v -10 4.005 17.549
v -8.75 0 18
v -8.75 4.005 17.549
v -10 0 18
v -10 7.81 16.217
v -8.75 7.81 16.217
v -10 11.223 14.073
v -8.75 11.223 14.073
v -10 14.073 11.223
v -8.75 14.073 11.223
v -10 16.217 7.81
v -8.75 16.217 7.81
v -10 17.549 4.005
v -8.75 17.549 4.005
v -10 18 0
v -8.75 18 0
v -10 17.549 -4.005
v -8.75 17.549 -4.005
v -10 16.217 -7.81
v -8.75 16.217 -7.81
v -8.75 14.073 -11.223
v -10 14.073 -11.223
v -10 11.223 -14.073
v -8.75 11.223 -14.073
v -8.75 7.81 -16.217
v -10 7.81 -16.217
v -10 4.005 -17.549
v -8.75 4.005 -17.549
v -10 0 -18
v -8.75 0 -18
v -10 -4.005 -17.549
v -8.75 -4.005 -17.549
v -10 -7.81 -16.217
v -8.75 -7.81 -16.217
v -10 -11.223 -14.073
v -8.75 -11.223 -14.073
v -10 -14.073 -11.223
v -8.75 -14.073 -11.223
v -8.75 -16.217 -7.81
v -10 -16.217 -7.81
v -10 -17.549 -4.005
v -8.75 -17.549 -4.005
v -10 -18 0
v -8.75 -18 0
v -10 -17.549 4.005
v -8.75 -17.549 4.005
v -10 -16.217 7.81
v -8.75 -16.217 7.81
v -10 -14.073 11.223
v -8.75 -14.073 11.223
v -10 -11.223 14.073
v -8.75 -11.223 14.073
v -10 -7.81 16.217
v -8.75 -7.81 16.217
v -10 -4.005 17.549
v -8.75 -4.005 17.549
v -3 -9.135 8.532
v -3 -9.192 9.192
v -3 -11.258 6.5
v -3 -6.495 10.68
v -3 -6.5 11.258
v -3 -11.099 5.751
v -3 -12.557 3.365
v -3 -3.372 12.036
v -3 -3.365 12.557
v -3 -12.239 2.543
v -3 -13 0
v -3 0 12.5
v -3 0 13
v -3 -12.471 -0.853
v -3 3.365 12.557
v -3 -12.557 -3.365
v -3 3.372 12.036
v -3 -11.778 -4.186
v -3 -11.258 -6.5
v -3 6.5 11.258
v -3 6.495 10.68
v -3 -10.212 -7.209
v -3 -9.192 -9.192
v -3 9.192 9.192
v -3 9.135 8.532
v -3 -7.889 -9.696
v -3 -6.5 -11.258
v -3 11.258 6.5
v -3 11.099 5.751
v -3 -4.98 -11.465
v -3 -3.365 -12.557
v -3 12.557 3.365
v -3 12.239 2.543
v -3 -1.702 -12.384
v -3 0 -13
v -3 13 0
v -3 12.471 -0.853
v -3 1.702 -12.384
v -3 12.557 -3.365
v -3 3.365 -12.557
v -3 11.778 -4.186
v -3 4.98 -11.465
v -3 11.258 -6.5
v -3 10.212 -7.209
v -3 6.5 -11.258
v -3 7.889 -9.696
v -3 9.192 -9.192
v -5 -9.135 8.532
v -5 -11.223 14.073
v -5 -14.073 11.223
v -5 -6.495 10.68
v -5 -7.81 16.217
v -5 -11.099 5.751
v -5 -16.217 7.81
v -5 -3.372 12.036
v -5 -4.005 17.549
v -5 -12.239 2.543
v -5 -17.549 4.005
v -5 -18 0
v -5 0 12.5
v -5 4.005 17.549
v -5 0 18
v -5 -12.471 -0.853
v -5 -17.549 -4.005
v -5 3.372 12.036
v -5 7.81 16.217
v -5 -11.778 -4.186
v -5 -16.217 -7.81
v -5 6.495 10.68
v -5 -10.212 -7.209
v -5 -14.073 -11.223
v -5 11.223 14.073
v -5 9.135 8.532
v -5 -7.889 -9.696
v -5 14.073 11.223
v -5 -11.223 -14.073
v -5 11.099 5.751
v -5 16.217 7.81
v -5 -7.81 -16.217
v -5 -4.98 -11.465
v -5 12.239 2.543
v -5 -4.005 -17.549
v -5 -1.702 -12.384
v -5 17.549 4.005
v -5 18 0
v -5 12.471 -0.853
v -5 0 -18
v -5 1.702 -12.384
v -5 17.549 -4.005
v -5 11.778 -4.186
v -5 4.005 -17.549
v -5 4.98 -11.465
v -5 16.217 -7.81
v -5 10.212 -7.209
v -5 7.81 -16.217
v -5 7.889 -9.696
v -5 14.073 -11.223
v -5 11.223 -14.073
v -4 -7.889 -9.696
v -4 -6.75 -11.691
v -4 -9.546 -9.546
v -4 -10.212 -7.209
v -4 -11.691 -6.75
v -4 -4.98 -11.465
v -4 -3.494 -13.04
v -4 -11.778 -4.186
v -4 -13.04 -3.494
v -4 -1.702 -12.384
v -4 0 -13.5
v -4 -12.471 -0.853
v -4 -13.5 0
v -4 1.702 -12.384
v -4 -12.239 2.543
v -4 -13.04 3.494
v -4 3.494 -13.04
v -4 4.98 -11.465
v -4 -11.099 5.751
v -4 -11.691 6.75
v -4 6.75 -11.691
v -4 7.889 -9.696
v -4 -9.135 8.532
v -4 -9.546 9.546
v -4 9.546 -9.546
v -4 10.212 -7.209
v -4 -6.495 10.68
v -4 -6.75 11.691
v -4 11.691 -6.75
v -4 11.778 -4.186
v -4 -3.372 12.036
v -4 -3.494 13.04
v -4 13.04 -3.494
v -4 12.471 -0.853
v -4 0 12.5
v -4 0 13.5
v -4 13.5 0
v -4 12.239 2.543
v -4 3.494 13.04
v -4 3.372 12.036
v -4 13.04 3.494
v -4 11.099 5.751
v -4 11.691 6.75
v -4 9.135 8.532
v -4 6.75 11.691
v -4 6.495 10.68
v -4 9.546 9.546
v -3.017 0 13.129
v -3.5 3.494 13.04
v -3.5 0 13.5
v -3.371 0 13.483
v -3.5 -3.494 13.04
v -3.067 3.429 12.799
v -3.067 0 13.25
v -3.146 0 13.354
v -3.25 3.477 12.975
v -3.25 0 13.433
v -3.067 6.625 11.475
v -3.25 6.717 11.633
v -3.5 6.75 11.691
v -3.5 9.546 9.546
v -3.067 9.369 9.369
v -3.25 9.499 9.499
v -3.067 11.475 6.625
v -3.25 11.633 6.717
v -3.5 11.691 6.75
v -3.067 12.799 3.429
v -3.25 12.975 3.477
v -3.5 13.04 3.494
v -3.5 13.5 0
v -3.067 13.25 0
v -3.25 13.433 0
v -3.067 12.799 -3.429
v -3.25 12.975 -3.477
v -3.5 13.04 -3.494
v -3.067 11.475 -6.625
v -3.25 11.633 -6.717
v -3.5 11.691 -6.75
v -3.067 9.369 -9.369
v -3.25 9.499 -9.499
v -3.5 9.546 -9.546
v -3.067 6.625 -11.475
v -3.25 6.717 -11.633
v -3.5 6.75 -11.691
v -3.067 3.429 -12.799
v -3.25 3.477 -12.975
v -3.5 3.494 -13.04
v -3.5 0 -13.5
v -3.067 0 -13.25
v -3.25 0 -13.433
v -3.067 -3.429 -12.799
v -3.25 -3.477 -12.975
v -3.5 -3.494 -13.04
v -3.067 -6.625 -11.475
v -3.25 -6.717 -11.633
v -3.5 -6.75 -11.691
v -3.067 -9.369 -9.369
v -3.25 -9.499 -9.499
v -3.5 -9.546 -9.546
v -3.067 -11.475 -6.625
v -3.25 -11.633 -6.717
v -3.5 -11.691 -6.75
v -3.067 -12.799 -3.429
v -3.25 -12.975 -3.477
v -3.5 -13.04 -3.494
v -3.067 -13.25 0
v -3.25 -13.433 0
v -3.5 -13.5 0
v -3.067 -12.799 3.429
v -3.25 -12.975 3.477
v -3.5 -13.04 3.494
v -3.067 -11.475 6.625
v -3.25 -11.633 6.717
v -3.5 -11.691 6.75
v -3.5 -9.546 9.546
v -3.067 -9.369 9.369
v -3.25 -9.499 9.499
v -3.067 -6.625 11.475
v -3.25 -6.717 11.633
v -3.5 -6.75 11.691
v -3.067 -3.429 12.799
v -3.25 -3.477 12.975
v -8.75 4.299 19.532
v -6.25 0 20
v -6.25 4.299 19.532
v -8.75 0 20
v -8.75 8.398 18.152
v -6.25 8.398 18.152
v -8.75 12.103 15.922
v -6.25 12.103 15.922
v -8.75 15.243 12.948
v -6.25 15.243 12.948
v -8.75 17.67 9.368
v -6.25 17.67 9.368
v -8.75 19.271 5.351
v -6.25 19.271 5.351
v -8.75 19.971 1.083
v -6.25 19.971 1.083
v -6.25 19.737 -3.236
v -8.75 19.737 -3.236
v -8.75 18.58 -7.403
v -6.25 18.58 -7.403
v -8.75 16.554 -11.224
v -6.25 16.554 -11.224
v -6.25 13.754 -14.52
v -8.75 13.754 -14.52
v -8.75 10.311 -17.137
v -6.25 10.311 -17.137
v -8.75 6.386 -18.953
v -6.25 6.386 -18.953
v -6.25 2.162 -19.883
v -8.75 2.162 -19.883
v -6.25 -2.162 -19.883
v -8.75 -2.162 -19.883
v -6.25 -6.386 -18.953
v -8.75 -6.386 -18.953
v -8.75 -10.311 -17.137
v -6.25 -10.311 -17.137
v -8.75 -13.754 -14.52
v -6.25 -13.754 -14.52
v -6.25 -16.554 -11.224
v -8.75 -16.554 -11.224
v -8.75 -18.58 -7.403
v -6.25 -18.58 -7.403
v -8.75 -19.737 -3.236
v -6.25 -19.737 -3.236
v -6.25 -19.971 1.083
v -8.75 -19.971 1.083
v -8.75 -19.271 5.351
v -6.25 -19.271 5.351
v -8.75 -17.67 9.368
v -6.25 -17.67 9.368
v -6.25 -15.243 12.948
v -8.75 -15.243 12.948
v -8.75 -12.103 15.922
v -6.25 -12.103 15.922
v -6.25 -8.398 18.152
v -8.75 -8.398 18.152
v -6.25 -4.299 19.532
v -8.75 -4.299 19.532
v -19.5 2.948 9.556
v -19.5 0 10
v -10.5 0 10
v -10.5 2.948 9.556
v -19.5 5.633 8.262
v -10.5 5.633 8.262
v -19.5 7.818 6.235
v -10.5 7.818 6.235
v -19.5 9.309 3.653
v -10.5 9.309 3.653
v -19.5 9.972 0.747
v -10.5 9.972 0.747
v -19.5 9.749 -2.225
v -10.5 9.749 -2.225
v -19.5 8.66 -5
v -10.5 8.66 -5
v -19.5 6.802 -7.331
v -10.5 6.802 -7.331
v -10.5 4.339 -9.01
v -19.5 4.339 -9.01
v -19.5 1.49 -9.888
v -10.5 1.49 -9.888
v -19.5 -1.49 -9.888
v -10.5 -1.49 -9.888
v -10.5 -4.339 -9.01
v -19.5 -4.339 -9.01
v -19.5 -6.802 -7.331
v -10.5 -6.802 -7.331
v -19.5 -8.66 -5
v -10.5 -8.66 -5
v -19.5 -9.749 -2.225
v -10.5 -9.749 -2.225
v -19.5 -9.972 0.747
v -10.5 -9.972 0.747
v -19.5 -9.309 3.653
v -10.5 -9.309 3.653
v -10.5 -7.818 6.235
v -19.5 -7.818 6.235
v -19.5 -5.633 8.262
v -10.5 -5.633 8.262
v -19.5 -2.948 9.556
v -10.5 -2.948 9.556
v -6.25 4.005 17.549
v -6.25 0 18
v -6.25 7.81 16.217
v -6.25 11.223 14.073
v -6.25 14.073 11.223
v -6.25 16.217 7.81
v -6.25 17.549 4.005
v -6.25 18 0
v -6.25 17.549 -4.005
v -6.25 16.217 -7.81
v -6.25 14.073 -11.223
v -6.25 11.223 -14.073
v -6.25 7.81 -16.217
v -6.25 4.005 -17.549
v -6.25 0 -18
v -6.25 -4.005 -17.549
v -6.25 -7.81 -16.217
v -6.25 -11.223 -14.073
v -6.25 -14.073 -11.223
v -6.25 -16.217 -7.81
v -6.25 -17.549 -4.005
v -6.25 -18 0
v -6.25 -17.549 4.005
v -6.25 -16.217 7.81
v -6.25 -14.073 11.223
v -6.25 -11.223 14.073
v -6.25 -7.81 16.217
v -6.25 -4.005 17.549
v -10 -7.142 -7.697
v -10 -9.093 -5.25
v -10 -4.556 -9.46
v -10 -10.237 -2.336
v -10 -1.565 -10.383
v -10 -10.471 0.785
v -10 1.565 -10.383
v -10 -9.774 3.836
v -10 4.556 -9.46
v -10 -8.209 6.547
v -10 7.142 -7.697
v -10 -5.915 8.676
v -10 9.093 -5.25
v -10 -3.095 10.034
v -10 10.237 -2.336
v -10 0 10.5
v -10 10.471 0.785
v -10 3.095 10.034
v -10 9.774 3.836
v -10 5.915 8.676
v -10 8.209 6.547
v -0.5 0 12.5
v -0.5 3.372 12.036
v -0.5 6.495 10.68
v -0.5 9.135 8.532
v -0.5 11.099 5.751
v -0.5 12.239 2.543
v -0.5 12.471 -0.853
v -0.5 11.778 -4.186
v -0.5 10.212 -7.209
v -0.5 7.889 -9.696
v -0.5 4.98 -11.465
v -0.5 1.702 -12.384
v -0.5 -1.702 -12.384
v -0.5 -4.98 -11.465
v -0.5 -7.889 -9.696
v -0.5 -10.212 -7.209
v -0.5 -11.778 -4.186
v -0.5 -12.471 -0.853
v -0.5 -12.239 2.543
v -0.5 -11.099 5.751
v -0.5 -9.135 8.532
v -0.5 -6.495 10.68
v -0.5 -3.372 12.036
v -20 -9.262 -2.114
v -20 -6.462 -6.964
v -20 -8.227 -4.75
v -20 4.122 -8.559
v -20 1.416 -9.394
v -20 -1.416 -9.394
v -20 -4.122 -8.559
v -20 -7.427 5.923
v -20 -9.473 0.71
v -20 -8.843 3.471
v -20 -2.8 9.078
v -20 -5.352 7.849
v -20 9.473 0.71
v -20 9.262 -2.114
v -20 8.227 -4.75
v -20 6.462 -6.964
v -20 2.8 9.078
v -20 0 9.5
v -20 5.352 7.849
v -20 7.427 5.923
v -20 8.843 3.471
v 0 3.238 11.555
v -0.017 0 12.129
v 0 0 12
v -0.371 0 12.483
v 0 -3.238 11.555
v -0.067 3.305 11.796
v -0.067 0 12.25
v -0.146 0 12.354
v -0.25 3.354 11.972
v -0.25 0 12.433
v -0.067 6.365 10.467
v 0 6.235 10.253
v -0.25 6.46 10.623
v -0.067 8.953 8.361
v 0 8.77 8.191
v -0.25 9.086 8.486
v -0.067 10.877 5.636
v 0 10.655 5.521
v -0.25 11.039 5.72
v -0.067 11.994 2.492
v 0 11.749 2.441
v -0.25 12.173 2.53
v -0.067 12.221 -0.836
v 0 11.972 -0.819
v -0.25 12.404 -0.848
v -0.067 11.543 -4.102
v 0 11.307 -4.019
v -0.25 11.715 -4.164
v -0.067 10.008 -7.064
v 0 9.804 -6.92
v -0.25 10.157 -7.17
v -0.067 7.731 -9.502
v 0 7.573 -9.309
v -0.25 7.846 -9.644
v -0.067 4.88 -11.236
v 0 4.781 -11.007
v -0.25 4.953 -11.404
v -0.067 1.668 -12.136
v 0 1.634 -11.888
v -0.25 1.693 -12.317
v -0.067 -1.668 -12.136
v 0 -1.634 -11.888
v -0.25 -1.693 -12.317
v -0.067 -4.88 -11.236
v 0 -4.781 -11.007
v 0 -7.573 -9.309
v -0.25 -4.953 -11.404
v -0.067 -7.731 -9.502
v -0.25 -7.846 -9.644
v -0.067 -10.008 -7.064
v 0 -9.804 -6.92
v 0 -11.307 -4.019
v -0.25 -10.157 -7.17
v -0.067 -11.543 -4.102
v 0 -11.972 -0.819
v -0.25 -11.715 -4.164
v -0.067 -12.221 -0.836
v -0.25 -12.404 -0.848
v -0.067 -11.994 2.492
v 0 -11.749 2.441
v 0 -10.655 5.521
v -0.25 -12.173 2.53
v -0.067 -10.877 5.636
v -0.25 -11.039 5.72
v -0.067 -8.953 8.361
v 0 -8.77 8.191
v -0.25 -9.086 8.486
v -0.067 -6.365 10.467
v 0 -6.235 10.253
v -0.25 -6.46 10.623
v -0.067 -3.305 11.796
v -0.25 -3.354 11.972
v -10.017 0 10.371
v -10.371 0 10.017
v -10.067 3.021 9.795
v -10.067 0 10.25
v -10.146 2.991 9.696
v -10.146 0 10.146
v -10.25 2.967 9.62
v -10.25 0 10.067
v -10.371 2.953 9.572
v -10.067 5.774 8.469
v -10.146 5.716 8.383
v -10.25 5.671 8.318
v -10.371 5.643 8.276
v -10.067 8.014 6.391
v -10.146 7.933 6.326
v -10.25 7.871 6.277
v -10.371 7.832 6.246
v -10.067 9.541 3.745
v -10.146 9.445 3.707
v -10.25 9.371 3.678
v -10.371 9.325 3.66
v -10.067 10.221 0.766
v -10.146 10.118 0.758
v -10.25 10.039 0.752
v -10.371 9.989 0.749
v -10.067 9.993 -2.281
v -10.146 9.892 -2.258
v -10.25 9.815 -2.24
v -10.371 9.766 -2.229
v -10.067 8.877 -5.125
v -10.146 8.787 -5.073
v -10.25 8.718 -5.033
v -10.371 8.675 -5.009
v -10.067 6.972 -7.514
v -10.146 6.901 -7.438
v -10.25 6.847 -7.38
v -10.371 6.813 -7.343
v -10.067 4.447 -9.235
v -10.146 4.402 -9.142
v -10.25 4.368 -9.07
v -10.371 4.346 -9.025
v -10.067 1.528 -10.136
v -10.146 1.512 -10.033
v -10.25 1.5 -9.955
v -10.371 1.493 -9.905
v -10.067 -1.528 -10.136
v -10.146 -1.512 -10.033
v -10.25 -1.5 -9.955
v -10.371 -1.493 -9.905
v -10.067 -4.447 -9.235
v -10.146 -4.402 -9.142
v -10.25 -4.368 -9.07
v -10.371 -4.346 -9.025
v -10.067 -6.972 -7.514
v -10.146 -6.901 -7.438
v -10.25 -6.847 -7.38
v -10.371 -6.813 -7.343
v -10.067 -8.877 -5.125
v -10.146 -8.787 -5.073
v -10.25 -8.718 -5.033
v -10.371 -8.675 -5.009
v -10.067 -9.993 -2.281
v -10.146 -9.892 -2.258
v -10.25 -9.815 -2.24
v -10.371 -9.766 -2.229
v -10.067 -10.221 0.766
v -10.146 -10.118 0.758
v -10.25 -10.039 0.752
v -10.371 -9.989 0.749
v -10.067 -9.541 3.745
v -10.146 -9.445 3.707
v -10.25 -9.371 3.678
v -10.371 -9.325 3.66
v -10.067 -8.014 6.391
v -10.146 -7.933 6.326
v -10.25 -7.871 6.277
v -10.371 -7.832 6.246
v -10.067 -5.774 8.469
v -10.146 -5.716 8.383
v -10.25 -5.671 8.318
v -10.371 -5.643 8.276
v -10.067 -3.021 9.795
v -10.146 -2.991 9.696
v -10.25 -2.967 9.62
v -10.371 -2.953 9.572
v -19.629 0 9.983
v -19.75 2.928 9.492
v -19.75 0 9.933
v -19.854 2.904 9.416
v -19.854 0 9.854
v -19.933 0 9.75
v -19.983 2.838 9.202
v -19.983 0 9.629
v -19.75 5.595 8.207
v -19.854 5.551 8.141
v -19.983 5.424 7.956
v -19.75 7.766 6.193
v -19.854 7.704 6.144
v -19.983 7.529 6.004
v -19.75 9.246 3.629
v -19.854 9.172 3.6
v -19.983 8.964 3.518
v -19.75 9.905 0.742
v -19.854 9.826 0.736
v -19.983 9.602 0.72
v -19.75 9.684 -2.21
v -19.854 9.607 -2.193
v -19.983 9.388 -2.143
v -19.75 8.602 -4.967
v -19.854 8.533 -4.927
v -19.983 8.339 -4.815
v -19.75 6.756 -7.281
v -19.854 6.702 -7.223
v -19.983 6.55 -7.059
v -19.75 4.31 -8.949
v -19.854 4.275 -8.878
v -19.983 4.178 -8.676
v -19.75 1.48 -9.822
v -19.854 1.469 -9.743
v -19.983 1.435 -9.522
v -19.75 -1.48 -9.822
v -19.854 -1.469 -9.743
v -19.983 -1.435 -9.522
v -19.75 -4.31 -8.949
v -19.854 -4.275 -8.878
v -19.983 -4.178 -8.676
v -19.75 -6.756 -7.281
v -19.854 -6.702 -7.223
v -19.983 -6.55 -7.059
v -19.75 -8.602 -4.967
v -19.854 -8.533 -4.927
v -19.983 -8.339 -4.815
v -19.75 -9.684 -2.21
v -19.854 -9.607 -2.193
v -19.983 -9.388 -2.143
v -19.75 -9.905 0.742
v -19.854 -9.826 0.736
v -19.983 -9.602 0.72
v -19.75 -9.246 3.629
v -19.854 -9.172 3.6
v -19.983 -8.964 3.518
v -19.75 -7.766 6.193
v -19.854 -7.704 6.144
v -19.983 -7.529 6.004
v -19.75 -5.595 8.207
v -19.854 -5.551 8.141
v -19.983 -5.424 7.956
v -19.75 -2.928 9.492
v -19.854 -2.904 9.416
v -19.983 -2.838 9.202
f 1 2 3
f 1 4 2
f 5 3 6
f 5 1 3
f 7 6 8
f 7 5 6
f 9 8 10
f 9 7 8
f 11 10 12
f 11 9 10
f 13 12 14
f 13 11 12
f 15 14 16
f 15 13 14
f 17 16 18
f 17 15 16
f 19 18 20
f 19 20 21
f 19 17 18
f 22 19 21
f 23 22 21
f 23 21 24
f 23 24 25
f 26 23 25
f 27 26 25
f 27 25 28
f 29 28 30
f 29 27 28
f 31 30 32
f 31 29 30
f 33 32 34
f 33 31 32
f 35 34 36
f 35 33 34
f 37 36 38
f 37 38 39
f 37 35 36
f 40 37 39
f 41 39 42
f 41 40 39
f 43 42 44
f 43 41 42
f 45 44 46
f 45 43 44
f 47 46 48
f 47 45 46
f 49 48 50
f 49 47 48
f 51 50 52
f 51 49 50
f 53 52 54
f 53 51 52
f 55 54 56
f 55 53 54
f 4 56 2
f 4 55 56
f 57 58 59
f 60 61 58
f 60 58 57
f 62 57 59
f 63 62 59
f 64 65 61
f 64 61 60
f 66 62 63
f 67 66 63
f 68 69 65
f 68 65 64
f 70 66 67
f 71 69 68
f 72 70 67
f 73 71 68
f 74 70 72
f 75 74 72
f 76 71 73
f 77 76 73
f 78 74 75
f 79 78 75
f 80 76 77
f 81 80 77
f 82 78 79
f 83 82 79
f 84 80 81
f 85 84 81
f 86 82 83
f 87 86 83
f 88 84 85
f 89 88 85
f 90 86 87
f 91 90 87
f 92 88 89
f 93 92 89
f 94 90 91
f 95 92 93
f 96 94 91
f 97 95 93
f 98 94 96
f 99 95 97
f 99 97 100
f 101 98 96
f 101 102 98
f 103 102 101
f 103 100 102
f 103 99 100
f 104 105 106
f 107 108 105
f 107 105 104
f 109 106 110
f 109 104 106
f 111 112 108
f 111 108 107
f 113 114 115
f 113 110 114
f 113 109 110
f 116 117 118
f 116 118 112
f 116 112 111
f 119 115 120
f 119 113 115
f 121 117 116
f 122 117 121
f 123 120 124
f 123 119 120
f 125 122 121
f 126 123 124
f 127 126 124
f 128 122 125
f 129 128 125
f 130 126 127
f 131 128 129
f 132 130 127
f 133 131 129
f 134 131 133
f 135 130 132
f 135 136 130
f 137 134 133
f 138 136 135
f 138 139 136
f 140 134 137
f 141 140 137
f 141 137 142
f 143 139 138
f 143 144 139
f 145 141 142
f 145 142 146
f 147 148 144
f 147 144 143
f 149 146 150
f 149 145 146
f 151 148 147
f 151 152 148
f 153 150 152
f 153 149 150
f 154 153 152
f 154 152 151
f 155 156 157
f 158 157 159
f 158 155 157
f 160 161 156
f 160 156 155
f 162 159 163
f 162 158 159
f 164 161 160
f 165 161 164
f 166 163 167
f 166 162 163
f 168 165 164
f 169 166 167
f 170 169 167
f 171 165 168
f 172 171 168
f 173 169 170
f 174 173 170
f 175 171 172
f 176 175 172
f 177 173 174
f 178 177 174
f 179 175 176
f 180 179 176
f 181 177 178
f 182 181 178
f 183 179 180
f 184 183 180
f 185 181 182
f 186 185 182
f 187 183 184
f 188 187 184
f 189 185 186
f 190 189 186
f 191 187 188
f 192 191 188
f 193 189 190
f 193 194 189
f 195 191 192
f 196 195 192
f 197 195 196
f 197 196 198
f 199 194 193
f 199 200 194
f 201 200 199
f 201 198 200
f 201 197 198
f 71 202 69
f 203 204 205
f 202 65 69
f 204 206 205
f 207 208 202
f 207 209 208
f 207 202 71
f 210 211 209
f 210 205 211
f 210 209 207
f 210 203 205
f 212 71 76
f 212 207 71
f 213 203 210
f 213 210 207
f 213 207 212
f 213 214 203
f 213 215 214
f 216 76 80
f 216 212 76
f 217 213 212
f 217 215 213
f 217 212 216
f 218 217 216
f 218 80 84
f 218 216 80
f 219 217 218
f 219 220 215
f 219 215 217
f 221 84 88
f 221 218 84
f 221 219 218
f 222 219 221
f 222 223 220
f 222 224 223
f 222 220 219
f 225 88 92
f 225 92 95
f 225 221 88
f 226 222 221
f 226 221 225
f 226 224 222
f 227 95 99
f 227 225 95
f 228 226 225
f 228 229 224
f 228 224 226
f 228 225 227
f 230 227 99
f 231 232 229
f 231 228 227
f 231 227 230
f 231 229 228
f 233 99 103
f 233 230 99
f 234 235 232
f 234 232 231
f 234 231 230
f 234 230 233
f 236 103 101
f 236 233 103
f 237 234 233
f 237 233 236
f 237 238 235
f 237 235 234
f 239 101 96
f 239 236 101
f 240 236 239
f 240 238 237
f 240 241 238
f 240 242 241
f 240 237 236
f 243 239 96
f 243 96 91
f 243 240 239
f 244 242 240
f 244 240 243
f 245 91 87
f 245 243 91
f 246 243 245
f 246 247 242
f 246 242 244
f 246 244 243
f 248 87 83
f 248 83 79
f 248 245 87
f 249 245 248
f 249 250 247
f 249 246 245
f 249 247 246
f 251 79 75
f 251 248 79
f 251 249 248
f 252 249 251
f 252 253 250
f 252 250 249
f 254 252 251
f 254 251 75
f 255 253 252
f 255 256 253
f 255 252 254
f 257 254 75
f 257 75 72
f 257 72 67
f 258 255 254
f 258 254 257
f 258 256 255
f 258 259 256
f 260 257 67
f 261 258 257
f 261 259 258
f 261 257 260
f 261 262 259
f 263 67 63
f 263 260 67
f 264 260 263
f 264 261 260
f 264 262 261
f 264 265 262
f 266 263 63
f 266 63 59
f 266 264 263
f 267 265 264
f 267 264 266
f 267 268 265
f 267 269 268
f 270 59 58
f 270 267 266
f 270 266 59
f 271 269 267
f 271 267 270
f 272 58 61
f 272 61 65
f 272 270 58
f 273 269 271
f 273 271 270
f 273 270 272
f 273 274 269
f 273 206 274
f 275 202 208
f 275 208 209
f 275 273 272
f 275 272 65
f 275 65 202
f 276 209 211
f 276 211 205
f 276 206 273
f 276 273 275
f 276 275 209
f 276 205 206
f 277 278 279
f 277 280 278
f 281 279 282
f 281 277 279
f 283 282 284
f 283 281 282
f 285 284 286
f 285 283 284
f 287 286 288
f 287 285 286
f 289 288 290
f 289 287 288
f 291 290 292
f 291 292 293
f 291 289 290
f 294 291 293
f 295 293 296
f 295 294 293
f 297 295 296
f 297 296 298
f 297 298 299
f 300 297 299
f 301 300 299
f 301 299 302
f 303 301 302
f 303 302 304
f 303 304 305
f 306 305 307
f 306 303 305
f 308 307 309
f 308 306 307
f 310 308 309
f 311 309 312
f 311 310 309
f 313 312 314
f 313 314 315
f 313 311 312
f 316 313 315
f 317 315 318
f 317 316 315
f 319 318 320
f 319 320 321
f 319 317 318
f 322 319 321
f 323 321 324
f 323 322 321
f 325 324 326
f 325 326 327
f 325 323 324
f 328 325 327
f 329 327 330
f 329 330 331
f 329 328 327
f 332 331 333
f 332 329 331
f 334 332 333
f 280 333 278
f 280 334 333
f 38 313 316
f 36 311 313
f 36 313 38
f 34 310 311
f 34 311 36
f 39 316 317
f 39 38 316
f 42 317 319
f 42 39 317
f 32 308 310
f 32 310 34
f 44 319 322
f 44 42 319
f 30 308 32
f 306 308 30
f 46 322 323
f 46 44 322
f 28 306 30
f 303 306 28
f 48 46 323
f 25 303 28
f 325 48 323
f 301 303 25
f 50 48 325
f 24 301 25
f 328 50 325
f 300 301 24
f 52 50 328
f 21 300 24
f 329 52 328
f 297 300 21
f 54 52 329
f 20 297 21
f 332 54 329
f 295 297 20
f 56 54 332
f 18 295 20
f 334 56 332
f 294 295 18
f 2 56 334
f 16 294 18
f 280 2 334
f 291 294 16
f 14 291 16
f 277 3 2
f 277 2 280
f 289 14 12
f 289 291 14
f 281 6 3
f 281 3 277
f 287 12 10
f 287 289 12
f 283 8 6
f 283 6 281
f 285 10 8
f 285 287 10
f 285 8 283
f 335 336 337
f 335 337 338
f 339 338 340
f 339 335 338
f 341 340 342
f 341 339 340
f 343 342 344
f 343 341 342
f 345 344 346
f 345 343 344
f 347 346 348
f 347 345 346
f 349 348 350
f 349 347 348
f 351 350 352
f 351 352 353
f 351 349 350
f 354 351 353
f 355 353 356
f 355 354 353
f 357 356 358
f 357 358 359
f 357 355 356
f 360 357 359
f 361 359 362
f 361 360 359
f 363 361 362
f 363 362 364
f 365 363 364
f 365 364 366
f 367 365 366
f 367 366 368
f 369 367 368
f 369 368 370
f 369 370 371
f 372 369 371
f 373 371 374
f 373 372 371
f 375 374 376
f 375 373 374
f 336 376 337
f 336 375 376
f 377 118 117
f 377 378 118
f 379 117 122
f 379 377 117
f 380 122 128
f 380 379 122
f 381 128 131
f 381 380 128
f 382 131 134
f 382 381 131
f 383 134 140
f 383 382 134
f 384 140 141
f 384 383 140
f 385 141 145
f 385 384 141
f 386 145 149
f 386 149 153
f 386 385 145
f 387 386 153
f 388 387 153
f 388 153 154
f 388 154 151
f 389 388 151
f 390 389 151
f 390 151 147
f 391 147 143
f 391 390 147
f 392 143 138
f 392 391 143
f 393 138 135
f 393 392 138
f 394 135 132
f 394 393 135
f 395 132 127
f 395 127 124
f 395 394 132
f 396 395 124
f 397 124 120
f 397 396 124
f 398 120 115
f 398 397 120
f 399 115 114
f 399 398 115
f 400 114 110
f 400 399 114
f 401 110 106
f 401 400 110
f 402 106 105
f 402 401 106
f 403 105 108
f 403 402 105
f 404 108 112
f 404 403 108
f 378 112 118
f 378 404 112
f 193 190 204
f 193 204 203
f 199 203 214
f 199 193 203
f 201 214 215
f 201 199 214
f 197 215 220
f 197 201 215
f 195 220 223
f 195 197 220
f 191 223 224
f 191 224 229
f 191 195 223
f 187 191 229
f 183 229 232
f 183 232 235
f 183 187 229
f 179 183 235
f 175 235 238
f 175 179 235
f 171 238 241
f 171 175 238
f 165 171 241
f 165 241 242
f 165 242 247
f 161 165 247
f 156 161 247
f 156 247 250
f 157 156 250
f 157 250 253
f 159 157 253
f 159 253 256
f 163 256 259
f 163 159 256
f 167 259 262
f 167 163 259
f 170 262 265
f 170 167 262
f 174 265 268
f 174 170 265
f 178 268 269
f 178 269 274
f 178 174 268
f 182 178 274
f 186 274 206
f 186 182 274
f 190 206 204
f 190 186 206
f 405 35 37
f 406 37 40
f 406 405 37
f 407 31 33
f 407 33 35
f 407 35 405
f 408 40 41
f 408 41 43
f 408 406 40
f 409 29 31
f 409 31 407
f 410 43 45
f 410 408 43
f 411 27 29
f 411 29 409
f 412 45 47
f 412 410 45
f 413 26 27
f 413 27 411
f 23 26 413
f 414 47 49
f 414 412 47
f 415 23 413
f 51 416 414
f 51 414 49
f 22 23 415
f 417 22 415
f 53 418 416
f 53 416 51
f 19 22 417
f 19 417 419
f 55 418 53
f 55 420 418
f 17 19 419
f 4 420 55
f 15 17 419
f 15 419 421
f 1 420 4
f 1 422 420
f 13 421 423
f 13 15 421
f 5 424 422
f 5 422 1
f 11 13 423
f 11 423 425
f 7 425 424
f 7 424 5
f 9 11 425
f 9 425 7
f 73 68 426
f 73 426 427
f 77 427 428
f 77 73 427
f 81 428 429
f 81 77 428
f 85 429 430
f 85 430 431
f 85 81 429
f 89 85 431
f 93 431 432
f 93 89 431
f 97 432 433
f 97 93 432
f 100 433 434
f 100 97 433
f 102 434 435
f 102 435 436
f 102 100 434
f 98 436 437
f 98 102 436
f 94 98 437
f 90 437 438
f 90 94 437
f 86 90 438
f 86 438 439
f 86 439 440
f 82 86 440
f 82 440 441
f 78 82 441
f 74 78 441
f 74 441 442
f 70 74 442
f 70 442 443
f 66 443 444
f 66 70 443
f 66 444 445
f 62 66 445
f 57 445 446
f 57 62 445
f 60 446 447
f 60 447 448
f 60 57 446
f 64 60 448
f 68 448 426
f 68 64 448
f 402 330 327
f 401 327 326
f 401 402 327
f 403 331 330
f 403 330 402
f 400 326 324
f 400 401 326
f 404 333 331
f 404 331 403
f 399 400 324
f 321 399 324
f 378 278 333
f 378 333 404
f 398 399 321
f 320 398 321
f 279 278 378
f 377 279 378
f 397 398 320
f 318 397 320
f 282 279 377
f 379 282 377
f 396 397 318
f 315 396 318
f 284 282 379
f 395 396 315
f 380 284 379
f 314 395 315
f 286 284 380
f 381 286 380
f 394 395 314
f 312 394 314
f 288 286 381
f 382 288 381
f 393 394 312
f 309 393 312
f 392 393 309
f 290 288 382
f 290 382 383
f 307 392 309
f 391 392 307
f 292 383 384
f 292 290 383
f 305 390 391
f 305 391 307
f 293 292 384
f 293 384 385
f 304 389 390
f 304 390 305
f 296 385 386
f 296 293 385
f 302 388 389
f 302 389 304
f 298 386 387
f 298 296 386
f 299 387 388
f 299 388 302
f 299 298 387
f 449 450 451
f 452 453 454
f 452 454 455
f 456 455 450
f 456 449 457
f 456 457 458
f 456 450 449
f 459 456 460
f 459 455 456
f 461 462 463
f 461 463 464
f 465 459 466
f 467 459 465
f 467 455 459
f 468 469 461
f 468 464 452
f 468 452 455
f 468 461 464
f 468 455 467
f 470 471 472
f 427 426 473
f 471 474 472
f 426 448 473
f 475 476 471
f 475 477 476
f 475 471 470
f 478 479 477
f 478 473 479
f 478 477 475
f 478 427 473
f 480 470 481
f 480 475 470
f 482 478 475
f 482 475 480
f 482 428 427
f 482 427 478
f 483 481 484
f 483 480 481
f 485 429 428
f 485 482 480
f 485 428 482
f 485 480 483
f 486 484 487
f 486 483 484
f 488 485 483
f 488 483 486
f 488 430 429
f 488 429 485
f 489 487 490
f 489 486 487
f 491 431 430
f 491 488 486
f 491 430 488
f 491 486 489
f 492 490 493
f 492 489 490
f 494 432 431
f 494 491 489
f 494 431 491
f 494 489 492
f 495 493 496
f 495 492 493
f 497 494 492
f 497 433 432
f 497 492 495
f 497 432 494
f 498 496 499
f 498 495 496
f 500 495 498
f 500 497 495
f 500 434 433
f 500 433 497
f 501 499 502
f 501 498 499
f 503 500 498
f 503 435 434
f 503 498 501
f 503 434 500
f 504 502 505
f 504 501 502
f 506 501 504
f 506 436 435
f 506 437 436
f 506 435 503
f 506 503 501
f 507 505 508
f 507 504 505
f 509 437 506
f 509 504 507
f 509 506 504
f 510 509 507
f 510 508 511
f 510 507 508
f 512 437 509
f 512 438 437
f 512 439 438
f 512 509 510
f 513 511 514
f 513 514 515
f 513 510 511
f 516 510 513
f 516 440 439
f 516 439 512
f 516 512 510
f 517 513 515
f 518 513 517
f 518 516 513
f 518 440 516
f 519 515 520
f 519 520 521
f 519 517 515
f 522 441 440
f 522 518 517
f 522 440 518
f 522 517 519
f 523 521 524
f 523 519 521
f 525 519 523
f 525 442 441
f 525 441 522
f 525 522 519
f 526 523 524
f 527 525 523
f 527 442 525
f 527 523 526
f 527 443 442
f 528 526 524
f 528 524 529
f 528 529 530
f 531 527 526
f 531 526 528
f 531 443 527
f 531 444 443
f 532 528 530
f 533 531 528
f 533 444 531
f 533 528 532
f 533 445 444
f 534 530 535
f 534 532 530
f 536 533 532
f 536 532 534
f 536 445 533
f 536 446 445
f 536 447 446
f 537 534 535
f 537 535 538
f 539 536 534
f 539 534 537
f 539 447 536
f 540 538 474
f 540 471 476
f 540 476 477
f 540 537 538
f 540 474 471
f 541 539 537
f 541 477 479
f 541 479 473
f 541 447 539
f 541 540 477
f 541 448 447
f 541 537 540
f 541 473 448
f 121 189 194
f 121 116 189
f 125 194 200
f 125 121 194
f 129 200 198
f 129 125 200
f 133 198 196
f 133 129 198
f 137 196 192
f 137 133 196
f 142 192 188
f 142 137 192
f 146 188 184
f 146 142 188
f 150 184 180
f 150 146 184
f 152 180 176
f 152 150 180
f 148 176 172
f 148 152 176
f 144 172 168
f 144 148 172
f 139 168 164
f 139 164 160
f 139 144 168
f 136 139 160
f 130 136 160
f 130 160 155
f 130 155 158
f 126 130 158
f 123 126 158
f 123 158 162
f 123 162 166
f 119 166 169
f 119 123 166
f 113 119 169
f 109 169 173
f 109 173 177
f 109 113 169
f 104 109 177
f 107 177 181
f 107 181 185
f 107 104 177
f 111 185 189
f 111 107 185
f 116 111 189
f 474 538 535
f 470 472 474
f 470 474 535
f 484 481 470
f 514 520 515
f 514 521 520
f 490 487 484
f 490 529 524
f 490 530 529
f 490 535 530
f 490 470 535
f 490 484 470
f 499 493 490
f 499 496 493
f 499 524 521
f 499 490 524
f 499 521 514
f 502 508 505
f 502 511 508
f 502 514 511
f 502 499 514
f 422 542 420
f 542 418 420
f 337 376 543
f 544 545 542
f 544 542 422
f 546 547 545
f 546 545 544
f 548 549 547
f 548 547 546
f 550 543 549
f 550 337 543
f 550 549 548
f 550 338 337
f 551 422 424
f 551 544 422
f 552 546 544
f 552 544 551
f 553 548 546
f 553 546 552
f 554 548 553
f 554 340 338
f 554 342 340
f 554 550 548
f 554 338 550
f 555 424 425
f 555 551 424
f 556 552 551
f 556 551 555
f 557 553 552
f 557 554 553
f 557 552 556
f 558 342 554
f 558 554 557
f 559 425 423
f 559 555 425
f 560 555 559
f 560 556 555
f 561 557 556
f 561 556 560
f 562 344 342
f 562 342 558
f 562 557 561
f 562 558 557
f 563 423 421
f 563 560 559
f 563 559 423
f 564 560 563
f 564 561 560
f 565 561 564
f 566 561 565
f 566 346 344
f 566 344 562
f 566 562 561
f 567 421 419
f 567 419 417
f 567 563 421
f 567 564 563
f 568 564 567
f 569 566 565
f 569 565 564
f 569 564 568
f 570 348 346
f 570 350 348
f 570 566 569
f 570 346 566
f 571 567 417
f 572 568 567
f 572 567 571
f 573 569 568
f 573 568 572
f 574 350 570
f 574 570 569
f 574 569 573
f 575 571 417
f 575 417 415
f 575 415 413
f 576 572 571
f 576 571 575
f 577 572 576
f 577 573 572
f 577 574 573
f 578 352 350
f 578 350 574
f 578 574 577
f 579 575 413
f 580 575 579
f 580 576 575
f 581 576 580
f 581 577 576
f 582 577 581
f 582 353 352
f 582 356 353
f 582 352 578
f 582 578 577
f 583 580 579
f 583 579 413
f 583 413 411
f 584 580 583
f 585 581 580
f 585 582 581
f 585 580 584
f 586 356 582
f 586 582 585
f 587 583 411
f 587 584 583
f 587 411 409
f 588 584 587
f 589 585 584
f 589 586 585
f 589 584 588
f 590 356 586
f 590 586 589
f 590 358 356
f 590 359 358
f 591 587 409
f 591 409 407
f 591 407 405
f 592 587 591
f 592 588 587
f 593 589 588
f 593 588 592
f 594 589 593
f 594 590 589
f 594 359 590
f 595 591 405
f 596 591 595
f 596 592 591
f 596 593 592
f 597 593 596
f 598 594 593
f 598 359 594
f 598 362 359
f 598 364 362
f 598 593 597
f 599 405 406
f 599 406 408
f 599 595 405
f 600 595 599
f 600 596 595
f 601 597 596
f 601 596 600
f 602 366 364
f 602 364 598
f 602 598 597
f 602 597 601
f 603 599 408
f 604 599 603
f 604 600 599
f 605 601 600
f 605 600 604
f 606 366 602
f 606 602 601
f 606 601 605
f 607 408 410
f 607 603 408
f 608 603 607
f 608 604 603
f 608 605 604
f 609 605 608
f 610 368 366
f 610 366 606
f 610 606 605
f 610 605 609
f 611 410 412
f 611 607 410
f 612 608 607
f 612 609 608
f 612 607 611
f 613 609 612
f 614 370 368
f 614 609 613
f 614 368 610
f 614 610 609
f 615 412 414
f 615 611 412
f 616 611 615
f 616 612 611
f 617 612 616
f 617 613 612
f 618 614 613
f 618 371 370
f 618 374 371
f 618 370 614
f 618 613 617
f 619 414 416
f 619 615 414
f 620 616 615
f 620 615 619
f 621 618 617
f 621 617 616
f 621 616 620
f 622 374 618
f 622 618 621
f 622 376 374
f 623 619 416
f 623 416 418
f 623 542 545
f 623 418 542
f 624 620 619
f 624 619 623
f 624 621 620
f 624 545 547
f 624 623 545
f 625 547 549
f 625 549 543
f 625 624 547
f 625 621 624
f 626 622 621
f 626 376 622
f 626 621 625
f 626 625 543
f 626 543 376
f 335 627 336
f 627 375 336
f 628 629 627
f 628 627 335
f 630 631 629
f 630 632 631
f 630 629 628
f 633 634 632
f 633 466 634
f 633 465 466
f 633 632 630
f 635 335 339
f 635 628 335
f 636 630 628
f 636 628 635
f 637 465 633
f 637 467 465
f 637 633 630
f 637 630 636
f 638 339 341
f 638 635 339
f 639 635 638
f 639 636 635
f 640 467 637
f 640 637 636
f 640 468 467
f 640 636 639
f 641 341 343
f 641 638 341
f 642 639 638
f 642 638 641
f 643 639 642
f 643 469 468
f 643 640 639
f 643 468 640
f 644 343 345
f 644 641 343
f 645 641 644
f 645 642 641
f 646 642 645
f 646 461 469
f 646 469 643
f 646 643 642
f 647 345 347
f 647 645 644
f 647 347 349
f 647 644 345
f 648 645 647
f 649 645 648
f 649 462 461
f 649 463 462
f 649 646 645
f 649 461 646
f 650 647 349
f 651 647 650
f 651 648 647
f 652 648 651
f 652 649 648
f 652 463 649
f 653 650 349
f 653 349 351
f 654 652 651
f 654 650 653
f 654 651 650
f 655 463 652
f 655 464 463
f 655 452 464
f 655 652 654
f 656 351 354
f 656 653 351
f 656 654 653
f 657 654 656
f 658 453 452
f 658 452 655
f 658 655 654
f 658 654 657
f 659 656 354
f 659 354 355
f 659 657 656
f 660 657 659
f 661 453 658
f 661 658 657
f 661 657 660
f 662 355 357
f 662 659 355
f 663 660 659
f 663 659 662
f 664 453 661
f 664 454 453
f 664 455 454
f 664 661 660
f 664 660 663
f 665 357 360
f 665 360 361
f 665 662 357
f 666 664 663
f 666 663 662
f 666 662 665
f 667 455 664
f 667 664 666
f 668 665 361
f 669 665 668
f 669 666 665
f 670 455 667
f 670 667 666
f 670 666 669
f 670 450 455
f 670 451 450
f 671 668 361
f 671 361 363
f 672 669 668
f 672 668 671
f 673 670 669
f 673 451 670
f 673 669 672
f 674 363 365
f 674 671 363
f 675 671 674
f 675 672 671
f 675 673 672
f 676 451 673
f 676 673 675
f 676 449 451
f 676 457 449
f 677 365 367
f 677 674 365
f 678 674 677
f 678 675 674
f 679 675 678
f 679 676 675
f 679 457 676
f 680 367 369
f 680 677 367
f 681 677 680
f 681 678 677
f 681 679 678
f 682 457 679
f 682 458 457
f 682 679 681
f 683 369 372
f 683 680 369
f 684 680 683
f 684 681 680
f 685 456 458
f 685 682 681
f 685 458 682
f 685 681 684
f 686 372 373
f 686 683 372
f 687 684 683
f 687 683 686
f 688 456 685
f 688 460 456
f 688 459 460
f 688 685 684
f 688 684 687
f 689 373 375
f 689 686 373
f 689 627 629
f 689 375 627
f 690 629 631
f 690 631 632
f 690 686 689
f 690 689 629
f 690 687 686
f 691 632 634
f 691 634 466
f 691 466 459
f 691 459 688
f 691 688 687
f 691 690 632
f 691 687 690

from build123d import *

# Parameters (mm, degrees)
F2_R = 0.5


with BuildPart() as f1:
    # F0 (on Front) → F1 (revolve)
    with BuildSketch(Plane.XZ):
        Polygon((-20, 0), (0, 0), (0, 12.5), (-3, 12.5), (-3, 13.5), (-4, 13.5), (-4, 12.5), (-5, 12.5), (-5, 18), (-6.25, 18), (-6.25, 20), (-8.75, 20), (-8.75, 18), (-10, 18), (-10, 10), (-20, 10), align=None)
    revolve(axis=Axis((-10, 0, 0), (-1, 0, 0)))

    # F2
    f2_edges = [f1.edges().sort_by_distance(p)[0] for p in [
        (-10, 0, -10),
        (-20, 0, -10),
        (-15, 0, 10),
        (-3, 0, -13.5),
        (0, 0, -12.5),
    ]]
    fillet(f2_edges, radius=F2_R)


solid = f1.part
